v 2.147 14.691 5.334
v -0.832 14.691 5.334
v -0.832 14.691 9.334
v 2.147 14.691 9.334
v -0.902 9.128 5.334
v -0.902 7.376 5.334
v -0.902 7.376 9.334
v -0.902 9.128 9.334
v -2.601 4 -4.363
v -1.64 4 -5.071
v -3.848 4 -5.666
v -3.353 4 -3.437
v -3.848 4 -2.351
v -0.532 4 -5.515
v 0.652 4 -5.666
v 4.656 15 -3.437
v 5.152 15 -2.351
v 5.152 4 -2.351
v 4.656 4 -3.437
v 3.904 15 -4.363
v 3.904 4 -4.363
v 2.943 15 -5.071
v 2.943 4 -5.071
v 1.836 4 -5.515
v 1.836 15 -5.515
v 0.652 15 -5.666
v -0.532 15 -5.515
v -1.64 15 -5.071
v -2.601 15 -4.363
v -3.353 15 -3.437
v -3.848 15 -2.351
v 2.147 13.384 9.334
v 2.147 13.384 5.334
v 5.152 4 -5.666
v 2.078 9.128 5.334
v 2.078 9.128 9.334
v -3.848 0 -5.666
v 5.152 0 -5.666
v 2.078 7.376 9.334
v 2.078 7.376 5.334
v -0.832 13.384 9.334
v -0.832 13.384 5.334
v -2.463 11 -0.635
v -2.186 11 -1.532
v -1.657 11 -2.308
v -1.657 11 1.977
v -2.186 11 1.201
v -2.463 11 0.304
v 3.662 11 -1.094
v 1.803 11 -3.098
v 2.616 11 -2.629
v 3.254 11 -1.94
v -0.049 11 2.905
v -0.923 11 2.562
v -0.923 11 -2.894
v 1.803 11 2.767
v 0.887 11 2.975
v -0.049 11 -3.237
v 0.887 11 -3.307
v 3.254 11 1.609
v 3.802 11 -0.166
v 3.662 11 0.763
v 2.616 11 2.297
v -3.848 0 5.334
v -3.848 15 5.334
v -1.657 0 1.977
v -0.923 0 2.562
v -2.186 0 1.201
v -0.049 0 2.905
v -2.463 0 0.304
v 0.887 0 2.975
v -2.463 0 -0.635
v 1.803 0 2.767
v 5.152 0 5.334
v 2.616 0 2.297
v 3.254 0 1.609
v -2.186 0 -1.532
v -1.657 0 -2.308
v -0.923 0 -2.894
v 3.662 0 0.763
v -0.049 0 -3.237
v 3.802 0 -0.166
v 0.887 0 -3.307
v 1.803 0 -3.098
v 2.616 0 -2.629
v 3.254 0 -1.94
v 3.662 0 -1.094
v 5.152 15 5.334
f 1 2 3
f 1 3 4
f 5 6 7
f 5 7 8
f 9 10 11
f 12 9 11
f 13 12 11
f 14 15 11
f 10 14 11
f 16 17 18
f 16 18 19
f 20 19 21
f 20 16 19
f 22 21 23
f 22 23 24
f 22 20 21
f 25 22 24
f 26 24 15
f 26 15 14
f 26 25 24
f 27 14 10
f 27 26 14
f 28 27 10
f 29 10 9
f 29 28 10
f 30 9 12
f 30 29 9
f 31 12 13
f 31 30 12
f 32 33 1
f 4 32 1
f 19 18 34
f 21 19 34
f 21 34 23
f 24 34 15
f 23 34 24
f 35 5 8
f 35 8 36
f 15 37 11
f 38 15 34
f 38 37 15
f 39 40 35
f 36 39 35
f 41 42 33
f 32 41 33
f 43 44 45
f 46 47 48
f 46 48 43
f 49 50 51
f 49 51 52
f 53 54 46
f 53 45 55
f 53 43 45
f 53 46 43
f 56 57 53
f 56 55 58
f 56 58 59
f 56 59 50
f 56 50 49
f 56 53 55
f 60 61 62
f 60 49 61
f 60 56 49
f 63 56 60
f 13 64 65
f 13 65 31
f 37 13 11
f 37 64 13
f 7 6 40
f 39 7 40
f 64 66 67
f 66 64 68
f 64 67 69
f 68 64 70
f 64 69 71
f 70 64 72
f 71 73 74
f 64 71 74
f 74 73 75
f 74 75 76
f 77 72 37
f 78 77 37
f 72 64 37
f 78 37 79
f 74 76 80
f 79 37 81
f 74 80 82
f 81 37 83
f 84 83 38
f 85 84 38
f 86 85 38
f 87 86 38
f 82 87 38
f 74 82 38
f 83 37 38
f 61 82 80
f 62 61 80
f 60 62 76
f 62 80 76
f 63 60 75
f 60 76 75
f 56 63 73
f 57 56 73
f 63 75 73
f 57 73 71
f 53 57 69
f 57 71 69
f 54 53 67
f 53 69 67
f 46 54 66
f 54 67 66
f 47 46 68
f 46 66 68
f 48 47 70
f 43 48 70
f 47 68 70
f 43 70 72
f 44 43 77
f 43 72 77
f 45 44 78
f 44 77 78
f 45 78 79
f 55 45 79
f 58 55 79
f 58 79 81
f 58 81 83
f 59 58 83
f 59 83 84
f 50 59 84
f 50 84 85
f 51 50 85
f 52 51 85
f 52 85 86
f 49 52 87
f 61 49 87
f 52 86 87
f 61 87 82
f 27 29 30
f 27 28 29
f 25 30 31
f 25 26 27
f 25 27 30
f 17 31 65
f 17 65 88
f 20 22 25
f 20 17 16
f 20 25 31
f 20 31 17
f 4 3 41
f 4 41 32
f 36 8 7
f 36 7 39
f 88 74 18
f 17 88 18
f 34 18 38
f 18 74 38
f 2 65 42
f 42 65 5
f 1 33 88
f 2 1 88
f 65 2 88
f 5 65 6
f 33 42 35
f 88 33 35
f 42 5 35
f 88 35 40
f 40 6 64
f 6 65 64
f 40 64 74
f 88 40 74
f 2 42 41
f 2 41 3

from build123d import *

# Parameters (mm, degrees)
SKETCH1_W           = 9
SKETCH1_H           = 11
BOSS_EXTRUDE1_DEPTH = 15
CUT_EXTRUDE1_DEPTH  = 11
SKETCH3_R           = 3.15
CUT_EXTRUDE2_DEPTH  = 11
SKETCH4_W           = 2.979879399
SKETCH4_H           = 1.306685084
SKETCH4_W_2         = 2.979879398
SKETCH4_H_2         = 1.752870235
BOSS_EXTRUDE2_DEPTH = 4


with BuildPart() as part:
    # Sketch1 → Boss-Extrude1 (new body)
    with BuildSketch(Plane(origin=(0, 0, 0), x_dir=(1, 0, 0), z_dir=(0, 1, 0))):
        with Locations((0.651810585, 0.165738162)):
            Rectangle(SKETCH1_W, SKETCH1_H)
    extrude(amount=BOSS_EXTRUDE1_DEPTH)

    # Sketch2 → Cut-Extrude1 (cut)
    with BuildSketch(Plane(origin=(0, 15, 0), x_dir=(1, 0, 0), z_dir=(0, 1, 0))):
        with BuildLine():
            Line((-3.848189415, 2.350983054), (-6.541968857, 7.081862959))
            Line((-6.541968857, 7.081862959), (7.054694978, 6.829449645))
            Line((7.054694978, 6.829449645), (5.151810585, 2.350983054))
            ThreePointArc((5.151810585, 2.350983054), (0.651810585, 5.665738162), (-3.848189415, 2.350983054))
        make_face()
    extrude(amount=-CUT_EXTRUDE1_DEPTH, mode=Mode.SUBTRACT)

    # Sketch3 → Cut-Extrude2 (cut)
    with BuildSketch(Plane.XZ):
        with Locations((0.651810585, -0.165738162)):
            Circle(SKETCH3_R)
    extrude(amount=-CUT_EXTRUDE2_DEPTH, mode=Mode.SUBTRACT)

    # Sketch4 → Boss-Extrude2 (add)
    with BuildSketch(Plane.XY.offset(5.334261838)):
        with Locations((0.657536683, 14.037179674)):
            Rectangle(SKETCH4_W, SKETCH4_H)
        with Locations((0.588068697, 8.251967659)):
            Rectangle(SKETCH4_W_2, SKETCH4_H_2)
    extrude(amount=BOSS_EXTRUDE2_DEPTH)


solid = part.part
